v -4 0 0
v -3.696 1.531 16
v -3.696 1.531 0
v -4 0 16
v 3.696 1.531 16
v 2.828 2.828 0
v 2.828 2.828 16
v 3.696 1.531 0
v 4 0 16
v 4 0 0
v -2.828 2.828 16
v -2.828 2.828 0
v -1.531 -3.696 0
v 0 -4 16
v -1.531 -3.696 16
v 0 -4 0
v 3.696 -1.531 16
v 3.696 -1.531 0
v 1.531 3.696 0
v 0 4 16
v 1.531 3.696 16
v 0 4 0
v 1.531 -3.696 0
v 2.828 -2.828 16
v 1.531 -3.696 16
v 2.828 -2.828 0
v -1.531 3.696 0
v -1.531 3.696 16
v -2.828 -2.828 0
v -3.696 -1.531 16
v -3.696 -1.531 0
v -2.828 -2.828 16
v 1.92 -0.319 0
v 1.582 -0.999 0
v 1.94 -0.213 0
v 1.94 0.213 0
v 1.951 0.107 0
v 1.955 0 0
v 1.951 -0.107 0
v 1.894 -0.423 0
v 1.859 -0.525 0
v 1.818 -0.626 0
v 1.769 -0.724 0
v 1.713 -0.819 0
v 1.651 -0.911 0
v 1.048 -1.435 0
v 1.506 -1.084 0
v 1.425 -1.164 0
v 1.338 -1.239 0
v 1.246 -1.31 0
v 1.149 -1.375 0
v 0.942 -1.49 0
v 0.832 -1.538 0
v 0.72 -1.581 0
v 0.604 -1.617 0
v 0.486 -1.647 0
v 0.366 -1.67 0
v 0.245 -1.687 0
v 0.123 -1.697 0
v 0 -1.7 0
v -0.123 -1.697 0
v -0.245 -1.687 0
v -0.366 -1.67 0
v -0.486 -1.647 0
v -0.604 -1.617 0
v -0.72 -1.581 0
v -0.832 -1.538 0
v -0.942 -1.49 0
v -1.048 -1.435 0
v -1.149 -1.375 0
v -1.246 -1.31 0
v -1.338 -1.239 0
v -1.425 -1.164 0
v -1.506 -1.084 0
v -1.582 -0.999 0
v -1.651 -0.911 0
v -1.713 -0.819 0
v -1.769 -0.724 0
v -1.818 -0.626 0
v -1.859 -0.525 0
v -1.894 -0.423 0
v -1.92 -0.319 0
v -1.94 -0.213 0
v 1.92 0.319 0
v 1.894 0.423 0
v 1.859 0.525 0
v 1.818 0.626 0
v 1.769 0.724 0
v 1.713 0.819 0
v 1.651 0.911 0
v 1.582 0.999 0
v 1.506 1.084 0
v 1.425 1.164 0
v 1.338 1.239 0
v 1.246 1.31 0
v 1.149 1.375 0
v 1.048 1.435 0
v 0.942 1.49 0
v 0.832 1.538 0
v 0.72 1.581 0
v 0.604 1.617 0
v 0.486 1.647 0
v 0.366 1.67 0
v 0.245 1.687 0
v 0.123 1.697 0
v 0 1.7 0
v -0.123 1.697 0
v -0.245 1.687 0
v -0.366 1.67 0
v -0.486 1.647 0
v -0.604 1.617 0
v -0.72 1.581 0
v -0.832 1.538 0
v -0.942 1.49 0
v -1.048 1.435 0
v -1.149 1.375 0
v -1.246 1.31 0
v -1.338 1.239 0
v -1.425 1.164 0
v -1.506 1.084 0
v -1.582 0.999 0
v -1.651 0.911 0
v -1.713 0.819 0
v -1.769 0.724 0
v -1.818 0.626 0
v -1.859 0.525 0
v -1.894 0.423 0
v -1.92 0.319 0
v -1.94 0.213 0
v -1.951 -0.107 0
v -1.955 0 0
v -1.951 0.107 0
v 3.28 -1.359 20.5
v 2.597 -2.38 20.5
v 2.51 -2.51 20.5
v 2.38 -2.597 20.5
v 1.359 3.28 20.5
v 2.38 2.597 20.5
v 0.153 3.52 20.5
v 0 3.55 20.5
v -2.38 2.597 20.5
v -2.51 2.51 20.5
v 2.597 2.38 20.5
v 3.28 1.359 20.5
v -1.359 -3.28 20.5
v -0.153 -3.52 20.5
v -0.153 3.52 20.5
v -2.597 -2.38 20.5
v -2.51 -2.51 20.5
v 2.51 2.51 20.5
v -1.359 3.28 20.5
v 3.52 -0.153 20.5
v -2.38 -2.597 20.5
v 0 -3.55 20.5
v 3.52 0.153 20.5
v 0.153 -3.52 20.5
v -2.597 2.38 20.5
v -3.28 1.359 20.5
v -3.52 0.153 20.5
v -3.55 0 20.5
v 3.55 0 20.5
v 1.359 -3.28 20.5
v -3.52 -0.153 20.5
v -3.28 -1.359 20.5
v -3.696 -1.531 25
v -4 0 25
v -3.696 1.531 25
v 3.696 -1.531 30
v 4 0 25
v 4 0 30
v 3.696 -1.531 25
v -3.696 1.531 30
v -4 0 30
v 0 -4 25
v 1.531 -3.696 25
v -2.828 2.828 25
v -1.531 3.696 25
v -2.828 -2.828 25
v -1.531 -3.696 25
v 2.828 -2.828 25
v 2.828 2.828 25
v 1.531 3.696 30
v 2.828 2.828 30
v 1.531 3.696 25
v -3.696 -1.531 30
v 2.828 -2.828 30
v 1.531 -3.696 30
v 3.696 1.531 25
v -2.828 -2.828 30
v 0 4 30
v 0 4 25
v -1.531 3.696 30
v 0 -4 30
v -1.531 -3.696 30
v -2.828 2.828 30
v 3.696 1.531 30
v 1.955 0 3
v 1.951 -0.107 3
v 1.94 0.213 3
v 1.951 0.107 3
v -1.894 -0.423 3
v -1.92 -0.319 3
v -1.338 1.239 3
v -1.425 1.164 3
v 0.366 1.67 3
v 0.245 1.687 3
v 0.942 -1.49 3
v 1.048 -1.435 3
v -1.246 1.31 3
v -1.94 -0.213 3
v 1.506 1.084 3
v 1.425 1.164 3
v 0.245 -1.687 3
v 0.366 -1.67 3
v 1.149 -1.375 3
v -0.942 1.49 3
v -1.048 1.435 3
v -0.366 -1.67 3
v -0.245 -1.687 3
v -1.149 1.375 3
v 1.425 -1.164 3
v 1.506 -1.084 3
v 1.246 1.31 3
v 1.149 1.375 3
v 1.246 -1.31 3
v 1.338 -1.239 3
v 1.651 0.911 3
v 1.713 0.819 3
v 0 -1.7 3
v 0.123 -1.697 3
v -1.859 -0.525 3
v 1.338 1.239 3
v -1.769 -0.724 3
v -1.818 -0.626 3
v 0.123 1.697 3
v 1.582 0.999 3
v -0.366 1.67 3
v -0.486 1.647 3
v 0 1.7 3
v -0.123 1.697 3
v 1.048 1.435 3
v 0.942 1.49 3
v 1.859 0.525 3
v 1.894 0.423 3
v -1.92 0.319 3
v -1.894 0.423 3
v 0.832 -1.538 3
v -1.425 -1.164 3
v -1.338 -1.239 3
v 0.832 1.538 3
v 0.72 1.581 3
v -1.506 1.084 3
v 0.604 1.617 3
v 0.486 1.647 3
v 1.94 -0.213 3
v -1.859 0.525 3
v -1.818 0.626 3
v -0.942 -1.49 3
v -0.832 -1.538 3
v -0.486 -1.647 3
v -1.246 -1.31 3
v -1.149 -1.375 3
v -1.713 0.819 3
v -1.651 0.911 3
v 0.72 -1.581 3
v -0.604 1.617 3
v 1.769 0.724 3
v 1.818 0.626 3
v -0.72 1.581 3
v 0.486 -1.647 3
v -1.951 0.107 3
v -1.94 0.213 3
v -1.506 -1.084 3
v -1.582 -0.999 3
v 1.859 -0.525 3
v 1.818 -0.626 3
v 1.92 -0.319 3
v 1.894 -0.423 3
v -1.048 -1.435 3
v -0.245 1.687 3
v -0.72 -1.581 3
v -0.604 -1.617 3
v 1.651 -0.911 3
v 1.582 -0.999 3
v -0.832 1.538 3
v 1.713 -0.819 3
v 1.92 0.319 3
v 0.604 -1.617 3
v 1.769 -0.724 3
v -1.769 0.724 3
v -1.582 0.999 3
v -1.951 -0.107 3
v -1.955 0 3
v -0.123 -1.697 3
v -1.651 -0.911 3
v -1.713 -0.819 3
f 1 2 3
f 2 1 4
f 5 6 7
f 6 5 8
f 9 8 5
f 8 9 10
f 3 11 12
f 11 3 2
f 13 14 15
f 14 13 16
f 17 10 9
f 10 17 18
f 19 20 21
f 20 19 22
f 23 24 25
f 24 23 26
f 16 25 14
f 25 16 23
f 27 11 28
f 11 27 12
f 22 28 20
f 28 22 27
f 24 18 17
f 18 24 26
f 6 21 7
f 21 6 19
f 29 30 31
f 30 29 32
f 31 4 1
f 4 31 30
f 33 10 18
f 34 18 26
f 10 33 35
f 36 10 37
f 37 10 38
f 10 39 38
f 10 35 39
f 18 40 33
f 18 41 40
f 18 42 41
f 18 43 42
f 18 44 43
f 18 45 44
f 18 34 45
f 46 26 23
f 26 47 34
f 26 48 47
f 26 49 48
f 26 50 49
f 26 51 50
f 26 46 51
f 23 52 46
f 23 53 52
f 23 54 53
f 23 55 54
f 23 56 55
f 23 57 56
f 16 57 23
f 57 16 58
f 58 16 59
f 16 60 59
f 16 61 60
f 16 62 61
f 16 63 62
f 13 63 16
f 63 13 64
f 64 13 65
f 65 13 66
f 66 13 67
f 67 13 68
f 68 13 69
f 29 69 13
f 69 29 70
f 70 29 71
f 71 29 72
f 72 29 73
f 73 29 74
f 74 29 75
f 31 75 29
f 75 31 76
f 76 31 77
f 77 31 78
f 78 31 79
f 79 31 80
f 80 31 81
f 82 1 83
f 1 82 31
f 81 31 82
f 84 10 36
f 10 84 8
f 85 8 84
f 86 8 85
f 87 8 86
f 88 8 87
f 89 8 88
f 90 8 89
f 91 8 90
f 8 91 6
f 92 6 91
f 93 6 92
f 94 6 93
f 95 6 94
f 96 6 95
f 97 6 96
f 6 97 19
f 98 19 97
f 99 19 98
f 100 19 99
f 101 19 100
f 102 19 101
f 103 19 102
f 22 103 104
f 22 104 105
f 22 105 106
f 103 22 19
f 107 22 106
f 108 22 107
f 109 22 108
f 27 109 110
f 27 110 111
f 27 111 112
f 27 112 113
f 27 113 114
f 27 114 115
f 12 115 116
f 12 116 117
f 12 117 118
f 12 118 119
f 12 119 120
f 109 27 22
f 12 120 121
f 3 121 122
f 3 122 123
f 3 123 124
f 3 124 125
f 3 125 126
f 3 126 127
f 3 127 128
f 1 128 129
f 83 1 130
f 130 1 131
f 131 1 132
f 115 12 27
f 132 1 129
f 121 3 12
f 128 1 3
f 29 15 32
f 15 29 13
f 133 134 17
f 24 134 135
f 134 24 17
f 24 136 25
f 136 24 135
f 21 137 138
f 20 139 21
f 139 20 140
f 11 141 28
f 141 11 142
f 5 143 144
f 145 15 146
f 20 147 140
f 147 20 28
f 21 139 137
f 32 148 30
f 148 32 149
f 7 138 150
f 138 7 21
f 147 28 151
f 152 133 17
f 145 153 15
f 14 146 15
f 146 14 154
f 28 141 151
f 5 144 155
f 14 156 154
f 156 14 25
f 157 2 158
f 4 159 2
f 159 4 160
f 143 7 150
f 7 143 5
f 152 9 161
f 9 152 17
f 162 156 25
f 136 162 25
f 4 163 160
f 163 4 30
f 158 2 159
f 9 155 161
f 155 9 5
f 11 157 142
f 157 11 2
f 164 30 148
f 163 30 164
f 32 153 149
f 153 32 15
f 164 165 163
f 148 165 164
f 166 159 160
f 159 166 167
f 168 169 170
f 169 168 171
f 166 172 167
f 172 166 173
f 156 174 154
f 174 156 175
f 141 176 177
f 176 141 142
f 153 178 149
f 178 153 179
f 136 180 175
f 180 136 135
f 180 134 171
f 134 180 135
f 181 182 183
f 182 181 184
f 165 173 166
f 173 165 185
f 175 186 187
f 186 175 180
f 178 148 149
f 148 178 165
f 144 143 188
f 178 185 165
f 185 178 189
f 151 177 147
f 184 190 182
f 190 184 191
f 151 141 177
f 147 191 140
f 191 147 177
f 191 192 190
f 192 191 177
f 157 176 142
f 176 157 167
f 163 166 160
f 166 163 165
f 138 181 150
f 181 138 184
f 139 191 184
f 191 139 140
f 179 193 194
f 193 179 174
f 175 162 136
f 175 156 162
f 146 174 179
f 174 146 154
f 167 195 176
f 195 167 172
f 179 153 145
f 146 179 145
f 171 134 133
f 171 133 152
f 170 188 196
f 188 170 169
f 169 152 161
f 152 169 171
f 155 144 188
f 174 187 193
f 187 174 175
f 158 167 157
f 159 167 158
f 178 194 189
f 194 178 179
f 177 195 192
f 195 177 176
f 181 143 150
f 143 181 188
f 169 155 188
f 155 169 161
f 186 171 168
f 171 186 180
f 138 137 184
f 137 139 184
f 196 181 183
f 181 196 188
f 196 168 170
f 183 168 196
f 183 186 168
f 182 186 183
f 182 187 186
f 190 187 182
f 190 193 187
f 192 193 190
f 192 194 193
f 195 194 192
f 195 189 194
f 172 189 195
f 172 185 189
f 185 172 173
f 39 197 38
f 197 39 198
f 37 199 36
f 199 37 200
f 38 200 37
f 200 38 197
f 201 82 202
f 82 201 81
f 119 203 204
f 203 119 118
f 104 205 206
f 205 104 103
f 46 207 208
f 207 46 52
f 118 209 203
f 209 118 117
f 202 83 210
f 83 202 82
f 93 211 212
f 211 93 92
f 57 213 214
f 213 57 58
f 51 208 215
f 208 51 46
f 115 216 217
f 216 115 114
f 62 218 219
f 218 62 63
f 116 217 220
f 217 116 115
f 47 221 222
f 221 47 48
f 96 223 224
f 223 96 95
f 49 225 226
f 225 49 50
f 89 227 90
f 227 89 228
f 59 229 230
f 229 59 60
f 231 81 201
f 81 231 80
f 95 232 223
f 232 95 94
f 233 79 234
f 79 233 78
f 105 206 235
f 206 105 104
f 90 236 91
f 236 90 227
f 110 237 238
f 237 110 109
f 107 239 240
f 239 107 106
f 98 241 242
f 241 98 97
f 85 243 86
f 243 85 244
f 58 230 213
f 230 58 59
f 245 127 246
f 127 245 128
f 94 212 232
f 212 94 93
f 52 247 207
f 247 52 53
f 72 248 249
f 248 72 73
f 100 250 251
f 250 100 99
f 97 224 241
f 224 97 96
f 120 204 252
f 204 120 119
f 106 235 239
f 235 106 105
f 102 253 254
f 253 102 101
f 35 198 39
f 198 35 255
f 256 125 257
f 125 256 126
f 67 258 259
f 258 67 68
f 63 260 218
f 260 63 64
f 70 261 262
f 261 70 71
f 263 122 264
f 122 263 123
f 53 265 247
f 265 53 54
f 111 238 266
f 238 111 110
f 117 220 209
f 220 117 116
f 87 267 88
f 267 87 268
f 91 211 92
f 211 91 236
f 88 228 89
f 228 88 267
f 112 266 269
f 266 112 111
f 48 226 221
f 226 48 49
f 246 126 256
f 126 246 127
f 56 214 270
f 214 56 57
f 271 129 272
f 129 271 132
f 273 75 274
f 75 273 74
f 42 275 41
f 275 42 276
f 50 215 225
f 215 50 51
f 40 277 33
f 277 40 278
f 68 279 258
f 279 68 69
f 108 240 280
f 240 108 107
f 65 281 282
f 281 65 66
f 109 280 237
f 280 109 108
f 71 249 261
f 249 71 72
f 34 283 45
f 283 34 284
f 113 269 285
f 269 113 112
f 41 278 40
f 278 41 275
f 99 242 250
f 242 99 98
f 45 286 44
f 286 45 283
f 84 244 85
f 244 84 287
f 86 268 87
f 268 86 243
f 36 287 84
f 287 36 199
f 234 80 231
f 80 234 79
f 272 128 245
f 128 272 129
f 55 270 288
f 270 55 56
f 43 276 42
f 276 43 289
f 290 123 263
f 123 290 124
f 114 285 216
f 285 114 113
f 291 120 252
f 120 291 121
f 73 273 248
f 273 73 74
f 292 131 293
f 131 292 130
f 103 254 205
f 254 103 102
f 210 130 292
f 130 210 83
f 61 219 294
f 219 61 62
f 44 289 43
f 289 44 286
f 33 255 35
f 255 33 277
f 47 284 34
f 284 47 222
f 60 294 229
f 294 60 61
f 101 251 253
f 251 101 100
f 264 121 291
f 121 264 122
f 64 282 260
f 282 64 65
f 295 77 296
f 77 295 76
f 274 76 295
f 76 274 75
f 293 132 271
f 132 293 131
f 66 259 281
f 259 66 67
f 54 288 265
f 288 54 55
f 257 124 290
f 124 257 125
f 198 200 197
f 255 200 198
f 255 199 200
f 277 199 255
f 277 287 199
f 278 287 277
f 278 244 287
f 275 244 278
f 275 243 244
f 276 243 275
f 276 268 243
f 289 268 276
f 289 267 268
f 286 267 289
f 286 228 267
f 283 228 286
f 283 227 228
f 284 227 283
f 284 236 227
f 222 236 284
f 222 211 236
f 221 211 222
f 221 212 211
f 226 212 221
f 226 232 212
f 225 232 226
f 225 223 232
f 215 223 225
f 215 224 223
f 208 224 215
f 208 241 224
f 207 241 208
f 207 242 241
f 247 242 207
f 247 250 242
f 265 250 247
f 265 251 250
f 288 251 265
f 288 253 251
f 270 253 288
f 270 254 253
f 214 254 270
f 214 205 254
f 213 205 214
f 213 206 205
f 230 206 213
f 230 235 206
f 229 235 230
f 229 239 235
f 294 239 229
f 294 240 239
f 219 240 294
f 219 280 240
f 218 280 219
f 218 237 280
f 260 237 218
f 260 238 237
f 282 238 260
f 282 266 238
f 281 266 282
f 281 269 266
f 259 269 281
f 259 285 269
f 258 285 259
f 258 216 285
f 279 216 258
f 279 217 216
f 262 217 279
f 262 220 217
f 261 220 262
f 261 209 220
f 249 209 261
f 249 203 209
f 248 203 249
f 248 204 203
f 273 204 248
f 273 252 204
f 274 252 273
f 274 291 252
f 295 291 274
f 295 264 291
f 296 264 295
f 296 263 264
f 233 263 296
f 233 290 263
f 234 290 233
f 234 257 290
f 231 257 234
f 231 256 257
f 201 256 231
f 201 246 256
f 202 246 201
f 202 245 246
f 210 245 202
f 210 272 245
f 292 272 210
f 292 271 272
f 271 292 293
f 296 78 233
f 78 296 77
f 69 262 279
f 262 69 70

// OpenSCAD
// Millimeters to enlarge the screw's socket of, AKA "how accurate is your printer?"
margin=0.1; // [0.1, 0.2]
// Do you want a groove in the handle?
shapedHandle=1; // [1:Yes, 0:No]
// How many sides do you want the handle to have?
sides=16; // [3:1:100]

module screw_head() {
    scale([1.15, 1, 1]) cylinder(1, (3.3+margin)/2, (3.3+margin)/2, $fn=100);
}

difference() {
    if (shapedHandle) {
        union() {
            cylinder(15, 4, 4, $fn=sides);
            translate([0, 0, 15]) hull() {
                cylinder(1, 4, 4, $fn=sides);
                translate([0, 0, 5]) cylinder(1, 3.5, 3.5, $fn=sides);
            }
            hull() {
                translate([0, 0, 20]) cylinder(1, 3.5, 3.5, $fn=sides);
                translate([0, 0, 25]) cylinder(1, 4, 4, $fn=sides);
            }
            translate([0, 0, 25]) cylinder(5, 4, 4, $fn=sides);
        }
    } else {
        cylinder(30, 4, 4, $fn=sides);
    }
    translate([0, 0, -1]) scale([1, 1, 4]) screw_head();
}
